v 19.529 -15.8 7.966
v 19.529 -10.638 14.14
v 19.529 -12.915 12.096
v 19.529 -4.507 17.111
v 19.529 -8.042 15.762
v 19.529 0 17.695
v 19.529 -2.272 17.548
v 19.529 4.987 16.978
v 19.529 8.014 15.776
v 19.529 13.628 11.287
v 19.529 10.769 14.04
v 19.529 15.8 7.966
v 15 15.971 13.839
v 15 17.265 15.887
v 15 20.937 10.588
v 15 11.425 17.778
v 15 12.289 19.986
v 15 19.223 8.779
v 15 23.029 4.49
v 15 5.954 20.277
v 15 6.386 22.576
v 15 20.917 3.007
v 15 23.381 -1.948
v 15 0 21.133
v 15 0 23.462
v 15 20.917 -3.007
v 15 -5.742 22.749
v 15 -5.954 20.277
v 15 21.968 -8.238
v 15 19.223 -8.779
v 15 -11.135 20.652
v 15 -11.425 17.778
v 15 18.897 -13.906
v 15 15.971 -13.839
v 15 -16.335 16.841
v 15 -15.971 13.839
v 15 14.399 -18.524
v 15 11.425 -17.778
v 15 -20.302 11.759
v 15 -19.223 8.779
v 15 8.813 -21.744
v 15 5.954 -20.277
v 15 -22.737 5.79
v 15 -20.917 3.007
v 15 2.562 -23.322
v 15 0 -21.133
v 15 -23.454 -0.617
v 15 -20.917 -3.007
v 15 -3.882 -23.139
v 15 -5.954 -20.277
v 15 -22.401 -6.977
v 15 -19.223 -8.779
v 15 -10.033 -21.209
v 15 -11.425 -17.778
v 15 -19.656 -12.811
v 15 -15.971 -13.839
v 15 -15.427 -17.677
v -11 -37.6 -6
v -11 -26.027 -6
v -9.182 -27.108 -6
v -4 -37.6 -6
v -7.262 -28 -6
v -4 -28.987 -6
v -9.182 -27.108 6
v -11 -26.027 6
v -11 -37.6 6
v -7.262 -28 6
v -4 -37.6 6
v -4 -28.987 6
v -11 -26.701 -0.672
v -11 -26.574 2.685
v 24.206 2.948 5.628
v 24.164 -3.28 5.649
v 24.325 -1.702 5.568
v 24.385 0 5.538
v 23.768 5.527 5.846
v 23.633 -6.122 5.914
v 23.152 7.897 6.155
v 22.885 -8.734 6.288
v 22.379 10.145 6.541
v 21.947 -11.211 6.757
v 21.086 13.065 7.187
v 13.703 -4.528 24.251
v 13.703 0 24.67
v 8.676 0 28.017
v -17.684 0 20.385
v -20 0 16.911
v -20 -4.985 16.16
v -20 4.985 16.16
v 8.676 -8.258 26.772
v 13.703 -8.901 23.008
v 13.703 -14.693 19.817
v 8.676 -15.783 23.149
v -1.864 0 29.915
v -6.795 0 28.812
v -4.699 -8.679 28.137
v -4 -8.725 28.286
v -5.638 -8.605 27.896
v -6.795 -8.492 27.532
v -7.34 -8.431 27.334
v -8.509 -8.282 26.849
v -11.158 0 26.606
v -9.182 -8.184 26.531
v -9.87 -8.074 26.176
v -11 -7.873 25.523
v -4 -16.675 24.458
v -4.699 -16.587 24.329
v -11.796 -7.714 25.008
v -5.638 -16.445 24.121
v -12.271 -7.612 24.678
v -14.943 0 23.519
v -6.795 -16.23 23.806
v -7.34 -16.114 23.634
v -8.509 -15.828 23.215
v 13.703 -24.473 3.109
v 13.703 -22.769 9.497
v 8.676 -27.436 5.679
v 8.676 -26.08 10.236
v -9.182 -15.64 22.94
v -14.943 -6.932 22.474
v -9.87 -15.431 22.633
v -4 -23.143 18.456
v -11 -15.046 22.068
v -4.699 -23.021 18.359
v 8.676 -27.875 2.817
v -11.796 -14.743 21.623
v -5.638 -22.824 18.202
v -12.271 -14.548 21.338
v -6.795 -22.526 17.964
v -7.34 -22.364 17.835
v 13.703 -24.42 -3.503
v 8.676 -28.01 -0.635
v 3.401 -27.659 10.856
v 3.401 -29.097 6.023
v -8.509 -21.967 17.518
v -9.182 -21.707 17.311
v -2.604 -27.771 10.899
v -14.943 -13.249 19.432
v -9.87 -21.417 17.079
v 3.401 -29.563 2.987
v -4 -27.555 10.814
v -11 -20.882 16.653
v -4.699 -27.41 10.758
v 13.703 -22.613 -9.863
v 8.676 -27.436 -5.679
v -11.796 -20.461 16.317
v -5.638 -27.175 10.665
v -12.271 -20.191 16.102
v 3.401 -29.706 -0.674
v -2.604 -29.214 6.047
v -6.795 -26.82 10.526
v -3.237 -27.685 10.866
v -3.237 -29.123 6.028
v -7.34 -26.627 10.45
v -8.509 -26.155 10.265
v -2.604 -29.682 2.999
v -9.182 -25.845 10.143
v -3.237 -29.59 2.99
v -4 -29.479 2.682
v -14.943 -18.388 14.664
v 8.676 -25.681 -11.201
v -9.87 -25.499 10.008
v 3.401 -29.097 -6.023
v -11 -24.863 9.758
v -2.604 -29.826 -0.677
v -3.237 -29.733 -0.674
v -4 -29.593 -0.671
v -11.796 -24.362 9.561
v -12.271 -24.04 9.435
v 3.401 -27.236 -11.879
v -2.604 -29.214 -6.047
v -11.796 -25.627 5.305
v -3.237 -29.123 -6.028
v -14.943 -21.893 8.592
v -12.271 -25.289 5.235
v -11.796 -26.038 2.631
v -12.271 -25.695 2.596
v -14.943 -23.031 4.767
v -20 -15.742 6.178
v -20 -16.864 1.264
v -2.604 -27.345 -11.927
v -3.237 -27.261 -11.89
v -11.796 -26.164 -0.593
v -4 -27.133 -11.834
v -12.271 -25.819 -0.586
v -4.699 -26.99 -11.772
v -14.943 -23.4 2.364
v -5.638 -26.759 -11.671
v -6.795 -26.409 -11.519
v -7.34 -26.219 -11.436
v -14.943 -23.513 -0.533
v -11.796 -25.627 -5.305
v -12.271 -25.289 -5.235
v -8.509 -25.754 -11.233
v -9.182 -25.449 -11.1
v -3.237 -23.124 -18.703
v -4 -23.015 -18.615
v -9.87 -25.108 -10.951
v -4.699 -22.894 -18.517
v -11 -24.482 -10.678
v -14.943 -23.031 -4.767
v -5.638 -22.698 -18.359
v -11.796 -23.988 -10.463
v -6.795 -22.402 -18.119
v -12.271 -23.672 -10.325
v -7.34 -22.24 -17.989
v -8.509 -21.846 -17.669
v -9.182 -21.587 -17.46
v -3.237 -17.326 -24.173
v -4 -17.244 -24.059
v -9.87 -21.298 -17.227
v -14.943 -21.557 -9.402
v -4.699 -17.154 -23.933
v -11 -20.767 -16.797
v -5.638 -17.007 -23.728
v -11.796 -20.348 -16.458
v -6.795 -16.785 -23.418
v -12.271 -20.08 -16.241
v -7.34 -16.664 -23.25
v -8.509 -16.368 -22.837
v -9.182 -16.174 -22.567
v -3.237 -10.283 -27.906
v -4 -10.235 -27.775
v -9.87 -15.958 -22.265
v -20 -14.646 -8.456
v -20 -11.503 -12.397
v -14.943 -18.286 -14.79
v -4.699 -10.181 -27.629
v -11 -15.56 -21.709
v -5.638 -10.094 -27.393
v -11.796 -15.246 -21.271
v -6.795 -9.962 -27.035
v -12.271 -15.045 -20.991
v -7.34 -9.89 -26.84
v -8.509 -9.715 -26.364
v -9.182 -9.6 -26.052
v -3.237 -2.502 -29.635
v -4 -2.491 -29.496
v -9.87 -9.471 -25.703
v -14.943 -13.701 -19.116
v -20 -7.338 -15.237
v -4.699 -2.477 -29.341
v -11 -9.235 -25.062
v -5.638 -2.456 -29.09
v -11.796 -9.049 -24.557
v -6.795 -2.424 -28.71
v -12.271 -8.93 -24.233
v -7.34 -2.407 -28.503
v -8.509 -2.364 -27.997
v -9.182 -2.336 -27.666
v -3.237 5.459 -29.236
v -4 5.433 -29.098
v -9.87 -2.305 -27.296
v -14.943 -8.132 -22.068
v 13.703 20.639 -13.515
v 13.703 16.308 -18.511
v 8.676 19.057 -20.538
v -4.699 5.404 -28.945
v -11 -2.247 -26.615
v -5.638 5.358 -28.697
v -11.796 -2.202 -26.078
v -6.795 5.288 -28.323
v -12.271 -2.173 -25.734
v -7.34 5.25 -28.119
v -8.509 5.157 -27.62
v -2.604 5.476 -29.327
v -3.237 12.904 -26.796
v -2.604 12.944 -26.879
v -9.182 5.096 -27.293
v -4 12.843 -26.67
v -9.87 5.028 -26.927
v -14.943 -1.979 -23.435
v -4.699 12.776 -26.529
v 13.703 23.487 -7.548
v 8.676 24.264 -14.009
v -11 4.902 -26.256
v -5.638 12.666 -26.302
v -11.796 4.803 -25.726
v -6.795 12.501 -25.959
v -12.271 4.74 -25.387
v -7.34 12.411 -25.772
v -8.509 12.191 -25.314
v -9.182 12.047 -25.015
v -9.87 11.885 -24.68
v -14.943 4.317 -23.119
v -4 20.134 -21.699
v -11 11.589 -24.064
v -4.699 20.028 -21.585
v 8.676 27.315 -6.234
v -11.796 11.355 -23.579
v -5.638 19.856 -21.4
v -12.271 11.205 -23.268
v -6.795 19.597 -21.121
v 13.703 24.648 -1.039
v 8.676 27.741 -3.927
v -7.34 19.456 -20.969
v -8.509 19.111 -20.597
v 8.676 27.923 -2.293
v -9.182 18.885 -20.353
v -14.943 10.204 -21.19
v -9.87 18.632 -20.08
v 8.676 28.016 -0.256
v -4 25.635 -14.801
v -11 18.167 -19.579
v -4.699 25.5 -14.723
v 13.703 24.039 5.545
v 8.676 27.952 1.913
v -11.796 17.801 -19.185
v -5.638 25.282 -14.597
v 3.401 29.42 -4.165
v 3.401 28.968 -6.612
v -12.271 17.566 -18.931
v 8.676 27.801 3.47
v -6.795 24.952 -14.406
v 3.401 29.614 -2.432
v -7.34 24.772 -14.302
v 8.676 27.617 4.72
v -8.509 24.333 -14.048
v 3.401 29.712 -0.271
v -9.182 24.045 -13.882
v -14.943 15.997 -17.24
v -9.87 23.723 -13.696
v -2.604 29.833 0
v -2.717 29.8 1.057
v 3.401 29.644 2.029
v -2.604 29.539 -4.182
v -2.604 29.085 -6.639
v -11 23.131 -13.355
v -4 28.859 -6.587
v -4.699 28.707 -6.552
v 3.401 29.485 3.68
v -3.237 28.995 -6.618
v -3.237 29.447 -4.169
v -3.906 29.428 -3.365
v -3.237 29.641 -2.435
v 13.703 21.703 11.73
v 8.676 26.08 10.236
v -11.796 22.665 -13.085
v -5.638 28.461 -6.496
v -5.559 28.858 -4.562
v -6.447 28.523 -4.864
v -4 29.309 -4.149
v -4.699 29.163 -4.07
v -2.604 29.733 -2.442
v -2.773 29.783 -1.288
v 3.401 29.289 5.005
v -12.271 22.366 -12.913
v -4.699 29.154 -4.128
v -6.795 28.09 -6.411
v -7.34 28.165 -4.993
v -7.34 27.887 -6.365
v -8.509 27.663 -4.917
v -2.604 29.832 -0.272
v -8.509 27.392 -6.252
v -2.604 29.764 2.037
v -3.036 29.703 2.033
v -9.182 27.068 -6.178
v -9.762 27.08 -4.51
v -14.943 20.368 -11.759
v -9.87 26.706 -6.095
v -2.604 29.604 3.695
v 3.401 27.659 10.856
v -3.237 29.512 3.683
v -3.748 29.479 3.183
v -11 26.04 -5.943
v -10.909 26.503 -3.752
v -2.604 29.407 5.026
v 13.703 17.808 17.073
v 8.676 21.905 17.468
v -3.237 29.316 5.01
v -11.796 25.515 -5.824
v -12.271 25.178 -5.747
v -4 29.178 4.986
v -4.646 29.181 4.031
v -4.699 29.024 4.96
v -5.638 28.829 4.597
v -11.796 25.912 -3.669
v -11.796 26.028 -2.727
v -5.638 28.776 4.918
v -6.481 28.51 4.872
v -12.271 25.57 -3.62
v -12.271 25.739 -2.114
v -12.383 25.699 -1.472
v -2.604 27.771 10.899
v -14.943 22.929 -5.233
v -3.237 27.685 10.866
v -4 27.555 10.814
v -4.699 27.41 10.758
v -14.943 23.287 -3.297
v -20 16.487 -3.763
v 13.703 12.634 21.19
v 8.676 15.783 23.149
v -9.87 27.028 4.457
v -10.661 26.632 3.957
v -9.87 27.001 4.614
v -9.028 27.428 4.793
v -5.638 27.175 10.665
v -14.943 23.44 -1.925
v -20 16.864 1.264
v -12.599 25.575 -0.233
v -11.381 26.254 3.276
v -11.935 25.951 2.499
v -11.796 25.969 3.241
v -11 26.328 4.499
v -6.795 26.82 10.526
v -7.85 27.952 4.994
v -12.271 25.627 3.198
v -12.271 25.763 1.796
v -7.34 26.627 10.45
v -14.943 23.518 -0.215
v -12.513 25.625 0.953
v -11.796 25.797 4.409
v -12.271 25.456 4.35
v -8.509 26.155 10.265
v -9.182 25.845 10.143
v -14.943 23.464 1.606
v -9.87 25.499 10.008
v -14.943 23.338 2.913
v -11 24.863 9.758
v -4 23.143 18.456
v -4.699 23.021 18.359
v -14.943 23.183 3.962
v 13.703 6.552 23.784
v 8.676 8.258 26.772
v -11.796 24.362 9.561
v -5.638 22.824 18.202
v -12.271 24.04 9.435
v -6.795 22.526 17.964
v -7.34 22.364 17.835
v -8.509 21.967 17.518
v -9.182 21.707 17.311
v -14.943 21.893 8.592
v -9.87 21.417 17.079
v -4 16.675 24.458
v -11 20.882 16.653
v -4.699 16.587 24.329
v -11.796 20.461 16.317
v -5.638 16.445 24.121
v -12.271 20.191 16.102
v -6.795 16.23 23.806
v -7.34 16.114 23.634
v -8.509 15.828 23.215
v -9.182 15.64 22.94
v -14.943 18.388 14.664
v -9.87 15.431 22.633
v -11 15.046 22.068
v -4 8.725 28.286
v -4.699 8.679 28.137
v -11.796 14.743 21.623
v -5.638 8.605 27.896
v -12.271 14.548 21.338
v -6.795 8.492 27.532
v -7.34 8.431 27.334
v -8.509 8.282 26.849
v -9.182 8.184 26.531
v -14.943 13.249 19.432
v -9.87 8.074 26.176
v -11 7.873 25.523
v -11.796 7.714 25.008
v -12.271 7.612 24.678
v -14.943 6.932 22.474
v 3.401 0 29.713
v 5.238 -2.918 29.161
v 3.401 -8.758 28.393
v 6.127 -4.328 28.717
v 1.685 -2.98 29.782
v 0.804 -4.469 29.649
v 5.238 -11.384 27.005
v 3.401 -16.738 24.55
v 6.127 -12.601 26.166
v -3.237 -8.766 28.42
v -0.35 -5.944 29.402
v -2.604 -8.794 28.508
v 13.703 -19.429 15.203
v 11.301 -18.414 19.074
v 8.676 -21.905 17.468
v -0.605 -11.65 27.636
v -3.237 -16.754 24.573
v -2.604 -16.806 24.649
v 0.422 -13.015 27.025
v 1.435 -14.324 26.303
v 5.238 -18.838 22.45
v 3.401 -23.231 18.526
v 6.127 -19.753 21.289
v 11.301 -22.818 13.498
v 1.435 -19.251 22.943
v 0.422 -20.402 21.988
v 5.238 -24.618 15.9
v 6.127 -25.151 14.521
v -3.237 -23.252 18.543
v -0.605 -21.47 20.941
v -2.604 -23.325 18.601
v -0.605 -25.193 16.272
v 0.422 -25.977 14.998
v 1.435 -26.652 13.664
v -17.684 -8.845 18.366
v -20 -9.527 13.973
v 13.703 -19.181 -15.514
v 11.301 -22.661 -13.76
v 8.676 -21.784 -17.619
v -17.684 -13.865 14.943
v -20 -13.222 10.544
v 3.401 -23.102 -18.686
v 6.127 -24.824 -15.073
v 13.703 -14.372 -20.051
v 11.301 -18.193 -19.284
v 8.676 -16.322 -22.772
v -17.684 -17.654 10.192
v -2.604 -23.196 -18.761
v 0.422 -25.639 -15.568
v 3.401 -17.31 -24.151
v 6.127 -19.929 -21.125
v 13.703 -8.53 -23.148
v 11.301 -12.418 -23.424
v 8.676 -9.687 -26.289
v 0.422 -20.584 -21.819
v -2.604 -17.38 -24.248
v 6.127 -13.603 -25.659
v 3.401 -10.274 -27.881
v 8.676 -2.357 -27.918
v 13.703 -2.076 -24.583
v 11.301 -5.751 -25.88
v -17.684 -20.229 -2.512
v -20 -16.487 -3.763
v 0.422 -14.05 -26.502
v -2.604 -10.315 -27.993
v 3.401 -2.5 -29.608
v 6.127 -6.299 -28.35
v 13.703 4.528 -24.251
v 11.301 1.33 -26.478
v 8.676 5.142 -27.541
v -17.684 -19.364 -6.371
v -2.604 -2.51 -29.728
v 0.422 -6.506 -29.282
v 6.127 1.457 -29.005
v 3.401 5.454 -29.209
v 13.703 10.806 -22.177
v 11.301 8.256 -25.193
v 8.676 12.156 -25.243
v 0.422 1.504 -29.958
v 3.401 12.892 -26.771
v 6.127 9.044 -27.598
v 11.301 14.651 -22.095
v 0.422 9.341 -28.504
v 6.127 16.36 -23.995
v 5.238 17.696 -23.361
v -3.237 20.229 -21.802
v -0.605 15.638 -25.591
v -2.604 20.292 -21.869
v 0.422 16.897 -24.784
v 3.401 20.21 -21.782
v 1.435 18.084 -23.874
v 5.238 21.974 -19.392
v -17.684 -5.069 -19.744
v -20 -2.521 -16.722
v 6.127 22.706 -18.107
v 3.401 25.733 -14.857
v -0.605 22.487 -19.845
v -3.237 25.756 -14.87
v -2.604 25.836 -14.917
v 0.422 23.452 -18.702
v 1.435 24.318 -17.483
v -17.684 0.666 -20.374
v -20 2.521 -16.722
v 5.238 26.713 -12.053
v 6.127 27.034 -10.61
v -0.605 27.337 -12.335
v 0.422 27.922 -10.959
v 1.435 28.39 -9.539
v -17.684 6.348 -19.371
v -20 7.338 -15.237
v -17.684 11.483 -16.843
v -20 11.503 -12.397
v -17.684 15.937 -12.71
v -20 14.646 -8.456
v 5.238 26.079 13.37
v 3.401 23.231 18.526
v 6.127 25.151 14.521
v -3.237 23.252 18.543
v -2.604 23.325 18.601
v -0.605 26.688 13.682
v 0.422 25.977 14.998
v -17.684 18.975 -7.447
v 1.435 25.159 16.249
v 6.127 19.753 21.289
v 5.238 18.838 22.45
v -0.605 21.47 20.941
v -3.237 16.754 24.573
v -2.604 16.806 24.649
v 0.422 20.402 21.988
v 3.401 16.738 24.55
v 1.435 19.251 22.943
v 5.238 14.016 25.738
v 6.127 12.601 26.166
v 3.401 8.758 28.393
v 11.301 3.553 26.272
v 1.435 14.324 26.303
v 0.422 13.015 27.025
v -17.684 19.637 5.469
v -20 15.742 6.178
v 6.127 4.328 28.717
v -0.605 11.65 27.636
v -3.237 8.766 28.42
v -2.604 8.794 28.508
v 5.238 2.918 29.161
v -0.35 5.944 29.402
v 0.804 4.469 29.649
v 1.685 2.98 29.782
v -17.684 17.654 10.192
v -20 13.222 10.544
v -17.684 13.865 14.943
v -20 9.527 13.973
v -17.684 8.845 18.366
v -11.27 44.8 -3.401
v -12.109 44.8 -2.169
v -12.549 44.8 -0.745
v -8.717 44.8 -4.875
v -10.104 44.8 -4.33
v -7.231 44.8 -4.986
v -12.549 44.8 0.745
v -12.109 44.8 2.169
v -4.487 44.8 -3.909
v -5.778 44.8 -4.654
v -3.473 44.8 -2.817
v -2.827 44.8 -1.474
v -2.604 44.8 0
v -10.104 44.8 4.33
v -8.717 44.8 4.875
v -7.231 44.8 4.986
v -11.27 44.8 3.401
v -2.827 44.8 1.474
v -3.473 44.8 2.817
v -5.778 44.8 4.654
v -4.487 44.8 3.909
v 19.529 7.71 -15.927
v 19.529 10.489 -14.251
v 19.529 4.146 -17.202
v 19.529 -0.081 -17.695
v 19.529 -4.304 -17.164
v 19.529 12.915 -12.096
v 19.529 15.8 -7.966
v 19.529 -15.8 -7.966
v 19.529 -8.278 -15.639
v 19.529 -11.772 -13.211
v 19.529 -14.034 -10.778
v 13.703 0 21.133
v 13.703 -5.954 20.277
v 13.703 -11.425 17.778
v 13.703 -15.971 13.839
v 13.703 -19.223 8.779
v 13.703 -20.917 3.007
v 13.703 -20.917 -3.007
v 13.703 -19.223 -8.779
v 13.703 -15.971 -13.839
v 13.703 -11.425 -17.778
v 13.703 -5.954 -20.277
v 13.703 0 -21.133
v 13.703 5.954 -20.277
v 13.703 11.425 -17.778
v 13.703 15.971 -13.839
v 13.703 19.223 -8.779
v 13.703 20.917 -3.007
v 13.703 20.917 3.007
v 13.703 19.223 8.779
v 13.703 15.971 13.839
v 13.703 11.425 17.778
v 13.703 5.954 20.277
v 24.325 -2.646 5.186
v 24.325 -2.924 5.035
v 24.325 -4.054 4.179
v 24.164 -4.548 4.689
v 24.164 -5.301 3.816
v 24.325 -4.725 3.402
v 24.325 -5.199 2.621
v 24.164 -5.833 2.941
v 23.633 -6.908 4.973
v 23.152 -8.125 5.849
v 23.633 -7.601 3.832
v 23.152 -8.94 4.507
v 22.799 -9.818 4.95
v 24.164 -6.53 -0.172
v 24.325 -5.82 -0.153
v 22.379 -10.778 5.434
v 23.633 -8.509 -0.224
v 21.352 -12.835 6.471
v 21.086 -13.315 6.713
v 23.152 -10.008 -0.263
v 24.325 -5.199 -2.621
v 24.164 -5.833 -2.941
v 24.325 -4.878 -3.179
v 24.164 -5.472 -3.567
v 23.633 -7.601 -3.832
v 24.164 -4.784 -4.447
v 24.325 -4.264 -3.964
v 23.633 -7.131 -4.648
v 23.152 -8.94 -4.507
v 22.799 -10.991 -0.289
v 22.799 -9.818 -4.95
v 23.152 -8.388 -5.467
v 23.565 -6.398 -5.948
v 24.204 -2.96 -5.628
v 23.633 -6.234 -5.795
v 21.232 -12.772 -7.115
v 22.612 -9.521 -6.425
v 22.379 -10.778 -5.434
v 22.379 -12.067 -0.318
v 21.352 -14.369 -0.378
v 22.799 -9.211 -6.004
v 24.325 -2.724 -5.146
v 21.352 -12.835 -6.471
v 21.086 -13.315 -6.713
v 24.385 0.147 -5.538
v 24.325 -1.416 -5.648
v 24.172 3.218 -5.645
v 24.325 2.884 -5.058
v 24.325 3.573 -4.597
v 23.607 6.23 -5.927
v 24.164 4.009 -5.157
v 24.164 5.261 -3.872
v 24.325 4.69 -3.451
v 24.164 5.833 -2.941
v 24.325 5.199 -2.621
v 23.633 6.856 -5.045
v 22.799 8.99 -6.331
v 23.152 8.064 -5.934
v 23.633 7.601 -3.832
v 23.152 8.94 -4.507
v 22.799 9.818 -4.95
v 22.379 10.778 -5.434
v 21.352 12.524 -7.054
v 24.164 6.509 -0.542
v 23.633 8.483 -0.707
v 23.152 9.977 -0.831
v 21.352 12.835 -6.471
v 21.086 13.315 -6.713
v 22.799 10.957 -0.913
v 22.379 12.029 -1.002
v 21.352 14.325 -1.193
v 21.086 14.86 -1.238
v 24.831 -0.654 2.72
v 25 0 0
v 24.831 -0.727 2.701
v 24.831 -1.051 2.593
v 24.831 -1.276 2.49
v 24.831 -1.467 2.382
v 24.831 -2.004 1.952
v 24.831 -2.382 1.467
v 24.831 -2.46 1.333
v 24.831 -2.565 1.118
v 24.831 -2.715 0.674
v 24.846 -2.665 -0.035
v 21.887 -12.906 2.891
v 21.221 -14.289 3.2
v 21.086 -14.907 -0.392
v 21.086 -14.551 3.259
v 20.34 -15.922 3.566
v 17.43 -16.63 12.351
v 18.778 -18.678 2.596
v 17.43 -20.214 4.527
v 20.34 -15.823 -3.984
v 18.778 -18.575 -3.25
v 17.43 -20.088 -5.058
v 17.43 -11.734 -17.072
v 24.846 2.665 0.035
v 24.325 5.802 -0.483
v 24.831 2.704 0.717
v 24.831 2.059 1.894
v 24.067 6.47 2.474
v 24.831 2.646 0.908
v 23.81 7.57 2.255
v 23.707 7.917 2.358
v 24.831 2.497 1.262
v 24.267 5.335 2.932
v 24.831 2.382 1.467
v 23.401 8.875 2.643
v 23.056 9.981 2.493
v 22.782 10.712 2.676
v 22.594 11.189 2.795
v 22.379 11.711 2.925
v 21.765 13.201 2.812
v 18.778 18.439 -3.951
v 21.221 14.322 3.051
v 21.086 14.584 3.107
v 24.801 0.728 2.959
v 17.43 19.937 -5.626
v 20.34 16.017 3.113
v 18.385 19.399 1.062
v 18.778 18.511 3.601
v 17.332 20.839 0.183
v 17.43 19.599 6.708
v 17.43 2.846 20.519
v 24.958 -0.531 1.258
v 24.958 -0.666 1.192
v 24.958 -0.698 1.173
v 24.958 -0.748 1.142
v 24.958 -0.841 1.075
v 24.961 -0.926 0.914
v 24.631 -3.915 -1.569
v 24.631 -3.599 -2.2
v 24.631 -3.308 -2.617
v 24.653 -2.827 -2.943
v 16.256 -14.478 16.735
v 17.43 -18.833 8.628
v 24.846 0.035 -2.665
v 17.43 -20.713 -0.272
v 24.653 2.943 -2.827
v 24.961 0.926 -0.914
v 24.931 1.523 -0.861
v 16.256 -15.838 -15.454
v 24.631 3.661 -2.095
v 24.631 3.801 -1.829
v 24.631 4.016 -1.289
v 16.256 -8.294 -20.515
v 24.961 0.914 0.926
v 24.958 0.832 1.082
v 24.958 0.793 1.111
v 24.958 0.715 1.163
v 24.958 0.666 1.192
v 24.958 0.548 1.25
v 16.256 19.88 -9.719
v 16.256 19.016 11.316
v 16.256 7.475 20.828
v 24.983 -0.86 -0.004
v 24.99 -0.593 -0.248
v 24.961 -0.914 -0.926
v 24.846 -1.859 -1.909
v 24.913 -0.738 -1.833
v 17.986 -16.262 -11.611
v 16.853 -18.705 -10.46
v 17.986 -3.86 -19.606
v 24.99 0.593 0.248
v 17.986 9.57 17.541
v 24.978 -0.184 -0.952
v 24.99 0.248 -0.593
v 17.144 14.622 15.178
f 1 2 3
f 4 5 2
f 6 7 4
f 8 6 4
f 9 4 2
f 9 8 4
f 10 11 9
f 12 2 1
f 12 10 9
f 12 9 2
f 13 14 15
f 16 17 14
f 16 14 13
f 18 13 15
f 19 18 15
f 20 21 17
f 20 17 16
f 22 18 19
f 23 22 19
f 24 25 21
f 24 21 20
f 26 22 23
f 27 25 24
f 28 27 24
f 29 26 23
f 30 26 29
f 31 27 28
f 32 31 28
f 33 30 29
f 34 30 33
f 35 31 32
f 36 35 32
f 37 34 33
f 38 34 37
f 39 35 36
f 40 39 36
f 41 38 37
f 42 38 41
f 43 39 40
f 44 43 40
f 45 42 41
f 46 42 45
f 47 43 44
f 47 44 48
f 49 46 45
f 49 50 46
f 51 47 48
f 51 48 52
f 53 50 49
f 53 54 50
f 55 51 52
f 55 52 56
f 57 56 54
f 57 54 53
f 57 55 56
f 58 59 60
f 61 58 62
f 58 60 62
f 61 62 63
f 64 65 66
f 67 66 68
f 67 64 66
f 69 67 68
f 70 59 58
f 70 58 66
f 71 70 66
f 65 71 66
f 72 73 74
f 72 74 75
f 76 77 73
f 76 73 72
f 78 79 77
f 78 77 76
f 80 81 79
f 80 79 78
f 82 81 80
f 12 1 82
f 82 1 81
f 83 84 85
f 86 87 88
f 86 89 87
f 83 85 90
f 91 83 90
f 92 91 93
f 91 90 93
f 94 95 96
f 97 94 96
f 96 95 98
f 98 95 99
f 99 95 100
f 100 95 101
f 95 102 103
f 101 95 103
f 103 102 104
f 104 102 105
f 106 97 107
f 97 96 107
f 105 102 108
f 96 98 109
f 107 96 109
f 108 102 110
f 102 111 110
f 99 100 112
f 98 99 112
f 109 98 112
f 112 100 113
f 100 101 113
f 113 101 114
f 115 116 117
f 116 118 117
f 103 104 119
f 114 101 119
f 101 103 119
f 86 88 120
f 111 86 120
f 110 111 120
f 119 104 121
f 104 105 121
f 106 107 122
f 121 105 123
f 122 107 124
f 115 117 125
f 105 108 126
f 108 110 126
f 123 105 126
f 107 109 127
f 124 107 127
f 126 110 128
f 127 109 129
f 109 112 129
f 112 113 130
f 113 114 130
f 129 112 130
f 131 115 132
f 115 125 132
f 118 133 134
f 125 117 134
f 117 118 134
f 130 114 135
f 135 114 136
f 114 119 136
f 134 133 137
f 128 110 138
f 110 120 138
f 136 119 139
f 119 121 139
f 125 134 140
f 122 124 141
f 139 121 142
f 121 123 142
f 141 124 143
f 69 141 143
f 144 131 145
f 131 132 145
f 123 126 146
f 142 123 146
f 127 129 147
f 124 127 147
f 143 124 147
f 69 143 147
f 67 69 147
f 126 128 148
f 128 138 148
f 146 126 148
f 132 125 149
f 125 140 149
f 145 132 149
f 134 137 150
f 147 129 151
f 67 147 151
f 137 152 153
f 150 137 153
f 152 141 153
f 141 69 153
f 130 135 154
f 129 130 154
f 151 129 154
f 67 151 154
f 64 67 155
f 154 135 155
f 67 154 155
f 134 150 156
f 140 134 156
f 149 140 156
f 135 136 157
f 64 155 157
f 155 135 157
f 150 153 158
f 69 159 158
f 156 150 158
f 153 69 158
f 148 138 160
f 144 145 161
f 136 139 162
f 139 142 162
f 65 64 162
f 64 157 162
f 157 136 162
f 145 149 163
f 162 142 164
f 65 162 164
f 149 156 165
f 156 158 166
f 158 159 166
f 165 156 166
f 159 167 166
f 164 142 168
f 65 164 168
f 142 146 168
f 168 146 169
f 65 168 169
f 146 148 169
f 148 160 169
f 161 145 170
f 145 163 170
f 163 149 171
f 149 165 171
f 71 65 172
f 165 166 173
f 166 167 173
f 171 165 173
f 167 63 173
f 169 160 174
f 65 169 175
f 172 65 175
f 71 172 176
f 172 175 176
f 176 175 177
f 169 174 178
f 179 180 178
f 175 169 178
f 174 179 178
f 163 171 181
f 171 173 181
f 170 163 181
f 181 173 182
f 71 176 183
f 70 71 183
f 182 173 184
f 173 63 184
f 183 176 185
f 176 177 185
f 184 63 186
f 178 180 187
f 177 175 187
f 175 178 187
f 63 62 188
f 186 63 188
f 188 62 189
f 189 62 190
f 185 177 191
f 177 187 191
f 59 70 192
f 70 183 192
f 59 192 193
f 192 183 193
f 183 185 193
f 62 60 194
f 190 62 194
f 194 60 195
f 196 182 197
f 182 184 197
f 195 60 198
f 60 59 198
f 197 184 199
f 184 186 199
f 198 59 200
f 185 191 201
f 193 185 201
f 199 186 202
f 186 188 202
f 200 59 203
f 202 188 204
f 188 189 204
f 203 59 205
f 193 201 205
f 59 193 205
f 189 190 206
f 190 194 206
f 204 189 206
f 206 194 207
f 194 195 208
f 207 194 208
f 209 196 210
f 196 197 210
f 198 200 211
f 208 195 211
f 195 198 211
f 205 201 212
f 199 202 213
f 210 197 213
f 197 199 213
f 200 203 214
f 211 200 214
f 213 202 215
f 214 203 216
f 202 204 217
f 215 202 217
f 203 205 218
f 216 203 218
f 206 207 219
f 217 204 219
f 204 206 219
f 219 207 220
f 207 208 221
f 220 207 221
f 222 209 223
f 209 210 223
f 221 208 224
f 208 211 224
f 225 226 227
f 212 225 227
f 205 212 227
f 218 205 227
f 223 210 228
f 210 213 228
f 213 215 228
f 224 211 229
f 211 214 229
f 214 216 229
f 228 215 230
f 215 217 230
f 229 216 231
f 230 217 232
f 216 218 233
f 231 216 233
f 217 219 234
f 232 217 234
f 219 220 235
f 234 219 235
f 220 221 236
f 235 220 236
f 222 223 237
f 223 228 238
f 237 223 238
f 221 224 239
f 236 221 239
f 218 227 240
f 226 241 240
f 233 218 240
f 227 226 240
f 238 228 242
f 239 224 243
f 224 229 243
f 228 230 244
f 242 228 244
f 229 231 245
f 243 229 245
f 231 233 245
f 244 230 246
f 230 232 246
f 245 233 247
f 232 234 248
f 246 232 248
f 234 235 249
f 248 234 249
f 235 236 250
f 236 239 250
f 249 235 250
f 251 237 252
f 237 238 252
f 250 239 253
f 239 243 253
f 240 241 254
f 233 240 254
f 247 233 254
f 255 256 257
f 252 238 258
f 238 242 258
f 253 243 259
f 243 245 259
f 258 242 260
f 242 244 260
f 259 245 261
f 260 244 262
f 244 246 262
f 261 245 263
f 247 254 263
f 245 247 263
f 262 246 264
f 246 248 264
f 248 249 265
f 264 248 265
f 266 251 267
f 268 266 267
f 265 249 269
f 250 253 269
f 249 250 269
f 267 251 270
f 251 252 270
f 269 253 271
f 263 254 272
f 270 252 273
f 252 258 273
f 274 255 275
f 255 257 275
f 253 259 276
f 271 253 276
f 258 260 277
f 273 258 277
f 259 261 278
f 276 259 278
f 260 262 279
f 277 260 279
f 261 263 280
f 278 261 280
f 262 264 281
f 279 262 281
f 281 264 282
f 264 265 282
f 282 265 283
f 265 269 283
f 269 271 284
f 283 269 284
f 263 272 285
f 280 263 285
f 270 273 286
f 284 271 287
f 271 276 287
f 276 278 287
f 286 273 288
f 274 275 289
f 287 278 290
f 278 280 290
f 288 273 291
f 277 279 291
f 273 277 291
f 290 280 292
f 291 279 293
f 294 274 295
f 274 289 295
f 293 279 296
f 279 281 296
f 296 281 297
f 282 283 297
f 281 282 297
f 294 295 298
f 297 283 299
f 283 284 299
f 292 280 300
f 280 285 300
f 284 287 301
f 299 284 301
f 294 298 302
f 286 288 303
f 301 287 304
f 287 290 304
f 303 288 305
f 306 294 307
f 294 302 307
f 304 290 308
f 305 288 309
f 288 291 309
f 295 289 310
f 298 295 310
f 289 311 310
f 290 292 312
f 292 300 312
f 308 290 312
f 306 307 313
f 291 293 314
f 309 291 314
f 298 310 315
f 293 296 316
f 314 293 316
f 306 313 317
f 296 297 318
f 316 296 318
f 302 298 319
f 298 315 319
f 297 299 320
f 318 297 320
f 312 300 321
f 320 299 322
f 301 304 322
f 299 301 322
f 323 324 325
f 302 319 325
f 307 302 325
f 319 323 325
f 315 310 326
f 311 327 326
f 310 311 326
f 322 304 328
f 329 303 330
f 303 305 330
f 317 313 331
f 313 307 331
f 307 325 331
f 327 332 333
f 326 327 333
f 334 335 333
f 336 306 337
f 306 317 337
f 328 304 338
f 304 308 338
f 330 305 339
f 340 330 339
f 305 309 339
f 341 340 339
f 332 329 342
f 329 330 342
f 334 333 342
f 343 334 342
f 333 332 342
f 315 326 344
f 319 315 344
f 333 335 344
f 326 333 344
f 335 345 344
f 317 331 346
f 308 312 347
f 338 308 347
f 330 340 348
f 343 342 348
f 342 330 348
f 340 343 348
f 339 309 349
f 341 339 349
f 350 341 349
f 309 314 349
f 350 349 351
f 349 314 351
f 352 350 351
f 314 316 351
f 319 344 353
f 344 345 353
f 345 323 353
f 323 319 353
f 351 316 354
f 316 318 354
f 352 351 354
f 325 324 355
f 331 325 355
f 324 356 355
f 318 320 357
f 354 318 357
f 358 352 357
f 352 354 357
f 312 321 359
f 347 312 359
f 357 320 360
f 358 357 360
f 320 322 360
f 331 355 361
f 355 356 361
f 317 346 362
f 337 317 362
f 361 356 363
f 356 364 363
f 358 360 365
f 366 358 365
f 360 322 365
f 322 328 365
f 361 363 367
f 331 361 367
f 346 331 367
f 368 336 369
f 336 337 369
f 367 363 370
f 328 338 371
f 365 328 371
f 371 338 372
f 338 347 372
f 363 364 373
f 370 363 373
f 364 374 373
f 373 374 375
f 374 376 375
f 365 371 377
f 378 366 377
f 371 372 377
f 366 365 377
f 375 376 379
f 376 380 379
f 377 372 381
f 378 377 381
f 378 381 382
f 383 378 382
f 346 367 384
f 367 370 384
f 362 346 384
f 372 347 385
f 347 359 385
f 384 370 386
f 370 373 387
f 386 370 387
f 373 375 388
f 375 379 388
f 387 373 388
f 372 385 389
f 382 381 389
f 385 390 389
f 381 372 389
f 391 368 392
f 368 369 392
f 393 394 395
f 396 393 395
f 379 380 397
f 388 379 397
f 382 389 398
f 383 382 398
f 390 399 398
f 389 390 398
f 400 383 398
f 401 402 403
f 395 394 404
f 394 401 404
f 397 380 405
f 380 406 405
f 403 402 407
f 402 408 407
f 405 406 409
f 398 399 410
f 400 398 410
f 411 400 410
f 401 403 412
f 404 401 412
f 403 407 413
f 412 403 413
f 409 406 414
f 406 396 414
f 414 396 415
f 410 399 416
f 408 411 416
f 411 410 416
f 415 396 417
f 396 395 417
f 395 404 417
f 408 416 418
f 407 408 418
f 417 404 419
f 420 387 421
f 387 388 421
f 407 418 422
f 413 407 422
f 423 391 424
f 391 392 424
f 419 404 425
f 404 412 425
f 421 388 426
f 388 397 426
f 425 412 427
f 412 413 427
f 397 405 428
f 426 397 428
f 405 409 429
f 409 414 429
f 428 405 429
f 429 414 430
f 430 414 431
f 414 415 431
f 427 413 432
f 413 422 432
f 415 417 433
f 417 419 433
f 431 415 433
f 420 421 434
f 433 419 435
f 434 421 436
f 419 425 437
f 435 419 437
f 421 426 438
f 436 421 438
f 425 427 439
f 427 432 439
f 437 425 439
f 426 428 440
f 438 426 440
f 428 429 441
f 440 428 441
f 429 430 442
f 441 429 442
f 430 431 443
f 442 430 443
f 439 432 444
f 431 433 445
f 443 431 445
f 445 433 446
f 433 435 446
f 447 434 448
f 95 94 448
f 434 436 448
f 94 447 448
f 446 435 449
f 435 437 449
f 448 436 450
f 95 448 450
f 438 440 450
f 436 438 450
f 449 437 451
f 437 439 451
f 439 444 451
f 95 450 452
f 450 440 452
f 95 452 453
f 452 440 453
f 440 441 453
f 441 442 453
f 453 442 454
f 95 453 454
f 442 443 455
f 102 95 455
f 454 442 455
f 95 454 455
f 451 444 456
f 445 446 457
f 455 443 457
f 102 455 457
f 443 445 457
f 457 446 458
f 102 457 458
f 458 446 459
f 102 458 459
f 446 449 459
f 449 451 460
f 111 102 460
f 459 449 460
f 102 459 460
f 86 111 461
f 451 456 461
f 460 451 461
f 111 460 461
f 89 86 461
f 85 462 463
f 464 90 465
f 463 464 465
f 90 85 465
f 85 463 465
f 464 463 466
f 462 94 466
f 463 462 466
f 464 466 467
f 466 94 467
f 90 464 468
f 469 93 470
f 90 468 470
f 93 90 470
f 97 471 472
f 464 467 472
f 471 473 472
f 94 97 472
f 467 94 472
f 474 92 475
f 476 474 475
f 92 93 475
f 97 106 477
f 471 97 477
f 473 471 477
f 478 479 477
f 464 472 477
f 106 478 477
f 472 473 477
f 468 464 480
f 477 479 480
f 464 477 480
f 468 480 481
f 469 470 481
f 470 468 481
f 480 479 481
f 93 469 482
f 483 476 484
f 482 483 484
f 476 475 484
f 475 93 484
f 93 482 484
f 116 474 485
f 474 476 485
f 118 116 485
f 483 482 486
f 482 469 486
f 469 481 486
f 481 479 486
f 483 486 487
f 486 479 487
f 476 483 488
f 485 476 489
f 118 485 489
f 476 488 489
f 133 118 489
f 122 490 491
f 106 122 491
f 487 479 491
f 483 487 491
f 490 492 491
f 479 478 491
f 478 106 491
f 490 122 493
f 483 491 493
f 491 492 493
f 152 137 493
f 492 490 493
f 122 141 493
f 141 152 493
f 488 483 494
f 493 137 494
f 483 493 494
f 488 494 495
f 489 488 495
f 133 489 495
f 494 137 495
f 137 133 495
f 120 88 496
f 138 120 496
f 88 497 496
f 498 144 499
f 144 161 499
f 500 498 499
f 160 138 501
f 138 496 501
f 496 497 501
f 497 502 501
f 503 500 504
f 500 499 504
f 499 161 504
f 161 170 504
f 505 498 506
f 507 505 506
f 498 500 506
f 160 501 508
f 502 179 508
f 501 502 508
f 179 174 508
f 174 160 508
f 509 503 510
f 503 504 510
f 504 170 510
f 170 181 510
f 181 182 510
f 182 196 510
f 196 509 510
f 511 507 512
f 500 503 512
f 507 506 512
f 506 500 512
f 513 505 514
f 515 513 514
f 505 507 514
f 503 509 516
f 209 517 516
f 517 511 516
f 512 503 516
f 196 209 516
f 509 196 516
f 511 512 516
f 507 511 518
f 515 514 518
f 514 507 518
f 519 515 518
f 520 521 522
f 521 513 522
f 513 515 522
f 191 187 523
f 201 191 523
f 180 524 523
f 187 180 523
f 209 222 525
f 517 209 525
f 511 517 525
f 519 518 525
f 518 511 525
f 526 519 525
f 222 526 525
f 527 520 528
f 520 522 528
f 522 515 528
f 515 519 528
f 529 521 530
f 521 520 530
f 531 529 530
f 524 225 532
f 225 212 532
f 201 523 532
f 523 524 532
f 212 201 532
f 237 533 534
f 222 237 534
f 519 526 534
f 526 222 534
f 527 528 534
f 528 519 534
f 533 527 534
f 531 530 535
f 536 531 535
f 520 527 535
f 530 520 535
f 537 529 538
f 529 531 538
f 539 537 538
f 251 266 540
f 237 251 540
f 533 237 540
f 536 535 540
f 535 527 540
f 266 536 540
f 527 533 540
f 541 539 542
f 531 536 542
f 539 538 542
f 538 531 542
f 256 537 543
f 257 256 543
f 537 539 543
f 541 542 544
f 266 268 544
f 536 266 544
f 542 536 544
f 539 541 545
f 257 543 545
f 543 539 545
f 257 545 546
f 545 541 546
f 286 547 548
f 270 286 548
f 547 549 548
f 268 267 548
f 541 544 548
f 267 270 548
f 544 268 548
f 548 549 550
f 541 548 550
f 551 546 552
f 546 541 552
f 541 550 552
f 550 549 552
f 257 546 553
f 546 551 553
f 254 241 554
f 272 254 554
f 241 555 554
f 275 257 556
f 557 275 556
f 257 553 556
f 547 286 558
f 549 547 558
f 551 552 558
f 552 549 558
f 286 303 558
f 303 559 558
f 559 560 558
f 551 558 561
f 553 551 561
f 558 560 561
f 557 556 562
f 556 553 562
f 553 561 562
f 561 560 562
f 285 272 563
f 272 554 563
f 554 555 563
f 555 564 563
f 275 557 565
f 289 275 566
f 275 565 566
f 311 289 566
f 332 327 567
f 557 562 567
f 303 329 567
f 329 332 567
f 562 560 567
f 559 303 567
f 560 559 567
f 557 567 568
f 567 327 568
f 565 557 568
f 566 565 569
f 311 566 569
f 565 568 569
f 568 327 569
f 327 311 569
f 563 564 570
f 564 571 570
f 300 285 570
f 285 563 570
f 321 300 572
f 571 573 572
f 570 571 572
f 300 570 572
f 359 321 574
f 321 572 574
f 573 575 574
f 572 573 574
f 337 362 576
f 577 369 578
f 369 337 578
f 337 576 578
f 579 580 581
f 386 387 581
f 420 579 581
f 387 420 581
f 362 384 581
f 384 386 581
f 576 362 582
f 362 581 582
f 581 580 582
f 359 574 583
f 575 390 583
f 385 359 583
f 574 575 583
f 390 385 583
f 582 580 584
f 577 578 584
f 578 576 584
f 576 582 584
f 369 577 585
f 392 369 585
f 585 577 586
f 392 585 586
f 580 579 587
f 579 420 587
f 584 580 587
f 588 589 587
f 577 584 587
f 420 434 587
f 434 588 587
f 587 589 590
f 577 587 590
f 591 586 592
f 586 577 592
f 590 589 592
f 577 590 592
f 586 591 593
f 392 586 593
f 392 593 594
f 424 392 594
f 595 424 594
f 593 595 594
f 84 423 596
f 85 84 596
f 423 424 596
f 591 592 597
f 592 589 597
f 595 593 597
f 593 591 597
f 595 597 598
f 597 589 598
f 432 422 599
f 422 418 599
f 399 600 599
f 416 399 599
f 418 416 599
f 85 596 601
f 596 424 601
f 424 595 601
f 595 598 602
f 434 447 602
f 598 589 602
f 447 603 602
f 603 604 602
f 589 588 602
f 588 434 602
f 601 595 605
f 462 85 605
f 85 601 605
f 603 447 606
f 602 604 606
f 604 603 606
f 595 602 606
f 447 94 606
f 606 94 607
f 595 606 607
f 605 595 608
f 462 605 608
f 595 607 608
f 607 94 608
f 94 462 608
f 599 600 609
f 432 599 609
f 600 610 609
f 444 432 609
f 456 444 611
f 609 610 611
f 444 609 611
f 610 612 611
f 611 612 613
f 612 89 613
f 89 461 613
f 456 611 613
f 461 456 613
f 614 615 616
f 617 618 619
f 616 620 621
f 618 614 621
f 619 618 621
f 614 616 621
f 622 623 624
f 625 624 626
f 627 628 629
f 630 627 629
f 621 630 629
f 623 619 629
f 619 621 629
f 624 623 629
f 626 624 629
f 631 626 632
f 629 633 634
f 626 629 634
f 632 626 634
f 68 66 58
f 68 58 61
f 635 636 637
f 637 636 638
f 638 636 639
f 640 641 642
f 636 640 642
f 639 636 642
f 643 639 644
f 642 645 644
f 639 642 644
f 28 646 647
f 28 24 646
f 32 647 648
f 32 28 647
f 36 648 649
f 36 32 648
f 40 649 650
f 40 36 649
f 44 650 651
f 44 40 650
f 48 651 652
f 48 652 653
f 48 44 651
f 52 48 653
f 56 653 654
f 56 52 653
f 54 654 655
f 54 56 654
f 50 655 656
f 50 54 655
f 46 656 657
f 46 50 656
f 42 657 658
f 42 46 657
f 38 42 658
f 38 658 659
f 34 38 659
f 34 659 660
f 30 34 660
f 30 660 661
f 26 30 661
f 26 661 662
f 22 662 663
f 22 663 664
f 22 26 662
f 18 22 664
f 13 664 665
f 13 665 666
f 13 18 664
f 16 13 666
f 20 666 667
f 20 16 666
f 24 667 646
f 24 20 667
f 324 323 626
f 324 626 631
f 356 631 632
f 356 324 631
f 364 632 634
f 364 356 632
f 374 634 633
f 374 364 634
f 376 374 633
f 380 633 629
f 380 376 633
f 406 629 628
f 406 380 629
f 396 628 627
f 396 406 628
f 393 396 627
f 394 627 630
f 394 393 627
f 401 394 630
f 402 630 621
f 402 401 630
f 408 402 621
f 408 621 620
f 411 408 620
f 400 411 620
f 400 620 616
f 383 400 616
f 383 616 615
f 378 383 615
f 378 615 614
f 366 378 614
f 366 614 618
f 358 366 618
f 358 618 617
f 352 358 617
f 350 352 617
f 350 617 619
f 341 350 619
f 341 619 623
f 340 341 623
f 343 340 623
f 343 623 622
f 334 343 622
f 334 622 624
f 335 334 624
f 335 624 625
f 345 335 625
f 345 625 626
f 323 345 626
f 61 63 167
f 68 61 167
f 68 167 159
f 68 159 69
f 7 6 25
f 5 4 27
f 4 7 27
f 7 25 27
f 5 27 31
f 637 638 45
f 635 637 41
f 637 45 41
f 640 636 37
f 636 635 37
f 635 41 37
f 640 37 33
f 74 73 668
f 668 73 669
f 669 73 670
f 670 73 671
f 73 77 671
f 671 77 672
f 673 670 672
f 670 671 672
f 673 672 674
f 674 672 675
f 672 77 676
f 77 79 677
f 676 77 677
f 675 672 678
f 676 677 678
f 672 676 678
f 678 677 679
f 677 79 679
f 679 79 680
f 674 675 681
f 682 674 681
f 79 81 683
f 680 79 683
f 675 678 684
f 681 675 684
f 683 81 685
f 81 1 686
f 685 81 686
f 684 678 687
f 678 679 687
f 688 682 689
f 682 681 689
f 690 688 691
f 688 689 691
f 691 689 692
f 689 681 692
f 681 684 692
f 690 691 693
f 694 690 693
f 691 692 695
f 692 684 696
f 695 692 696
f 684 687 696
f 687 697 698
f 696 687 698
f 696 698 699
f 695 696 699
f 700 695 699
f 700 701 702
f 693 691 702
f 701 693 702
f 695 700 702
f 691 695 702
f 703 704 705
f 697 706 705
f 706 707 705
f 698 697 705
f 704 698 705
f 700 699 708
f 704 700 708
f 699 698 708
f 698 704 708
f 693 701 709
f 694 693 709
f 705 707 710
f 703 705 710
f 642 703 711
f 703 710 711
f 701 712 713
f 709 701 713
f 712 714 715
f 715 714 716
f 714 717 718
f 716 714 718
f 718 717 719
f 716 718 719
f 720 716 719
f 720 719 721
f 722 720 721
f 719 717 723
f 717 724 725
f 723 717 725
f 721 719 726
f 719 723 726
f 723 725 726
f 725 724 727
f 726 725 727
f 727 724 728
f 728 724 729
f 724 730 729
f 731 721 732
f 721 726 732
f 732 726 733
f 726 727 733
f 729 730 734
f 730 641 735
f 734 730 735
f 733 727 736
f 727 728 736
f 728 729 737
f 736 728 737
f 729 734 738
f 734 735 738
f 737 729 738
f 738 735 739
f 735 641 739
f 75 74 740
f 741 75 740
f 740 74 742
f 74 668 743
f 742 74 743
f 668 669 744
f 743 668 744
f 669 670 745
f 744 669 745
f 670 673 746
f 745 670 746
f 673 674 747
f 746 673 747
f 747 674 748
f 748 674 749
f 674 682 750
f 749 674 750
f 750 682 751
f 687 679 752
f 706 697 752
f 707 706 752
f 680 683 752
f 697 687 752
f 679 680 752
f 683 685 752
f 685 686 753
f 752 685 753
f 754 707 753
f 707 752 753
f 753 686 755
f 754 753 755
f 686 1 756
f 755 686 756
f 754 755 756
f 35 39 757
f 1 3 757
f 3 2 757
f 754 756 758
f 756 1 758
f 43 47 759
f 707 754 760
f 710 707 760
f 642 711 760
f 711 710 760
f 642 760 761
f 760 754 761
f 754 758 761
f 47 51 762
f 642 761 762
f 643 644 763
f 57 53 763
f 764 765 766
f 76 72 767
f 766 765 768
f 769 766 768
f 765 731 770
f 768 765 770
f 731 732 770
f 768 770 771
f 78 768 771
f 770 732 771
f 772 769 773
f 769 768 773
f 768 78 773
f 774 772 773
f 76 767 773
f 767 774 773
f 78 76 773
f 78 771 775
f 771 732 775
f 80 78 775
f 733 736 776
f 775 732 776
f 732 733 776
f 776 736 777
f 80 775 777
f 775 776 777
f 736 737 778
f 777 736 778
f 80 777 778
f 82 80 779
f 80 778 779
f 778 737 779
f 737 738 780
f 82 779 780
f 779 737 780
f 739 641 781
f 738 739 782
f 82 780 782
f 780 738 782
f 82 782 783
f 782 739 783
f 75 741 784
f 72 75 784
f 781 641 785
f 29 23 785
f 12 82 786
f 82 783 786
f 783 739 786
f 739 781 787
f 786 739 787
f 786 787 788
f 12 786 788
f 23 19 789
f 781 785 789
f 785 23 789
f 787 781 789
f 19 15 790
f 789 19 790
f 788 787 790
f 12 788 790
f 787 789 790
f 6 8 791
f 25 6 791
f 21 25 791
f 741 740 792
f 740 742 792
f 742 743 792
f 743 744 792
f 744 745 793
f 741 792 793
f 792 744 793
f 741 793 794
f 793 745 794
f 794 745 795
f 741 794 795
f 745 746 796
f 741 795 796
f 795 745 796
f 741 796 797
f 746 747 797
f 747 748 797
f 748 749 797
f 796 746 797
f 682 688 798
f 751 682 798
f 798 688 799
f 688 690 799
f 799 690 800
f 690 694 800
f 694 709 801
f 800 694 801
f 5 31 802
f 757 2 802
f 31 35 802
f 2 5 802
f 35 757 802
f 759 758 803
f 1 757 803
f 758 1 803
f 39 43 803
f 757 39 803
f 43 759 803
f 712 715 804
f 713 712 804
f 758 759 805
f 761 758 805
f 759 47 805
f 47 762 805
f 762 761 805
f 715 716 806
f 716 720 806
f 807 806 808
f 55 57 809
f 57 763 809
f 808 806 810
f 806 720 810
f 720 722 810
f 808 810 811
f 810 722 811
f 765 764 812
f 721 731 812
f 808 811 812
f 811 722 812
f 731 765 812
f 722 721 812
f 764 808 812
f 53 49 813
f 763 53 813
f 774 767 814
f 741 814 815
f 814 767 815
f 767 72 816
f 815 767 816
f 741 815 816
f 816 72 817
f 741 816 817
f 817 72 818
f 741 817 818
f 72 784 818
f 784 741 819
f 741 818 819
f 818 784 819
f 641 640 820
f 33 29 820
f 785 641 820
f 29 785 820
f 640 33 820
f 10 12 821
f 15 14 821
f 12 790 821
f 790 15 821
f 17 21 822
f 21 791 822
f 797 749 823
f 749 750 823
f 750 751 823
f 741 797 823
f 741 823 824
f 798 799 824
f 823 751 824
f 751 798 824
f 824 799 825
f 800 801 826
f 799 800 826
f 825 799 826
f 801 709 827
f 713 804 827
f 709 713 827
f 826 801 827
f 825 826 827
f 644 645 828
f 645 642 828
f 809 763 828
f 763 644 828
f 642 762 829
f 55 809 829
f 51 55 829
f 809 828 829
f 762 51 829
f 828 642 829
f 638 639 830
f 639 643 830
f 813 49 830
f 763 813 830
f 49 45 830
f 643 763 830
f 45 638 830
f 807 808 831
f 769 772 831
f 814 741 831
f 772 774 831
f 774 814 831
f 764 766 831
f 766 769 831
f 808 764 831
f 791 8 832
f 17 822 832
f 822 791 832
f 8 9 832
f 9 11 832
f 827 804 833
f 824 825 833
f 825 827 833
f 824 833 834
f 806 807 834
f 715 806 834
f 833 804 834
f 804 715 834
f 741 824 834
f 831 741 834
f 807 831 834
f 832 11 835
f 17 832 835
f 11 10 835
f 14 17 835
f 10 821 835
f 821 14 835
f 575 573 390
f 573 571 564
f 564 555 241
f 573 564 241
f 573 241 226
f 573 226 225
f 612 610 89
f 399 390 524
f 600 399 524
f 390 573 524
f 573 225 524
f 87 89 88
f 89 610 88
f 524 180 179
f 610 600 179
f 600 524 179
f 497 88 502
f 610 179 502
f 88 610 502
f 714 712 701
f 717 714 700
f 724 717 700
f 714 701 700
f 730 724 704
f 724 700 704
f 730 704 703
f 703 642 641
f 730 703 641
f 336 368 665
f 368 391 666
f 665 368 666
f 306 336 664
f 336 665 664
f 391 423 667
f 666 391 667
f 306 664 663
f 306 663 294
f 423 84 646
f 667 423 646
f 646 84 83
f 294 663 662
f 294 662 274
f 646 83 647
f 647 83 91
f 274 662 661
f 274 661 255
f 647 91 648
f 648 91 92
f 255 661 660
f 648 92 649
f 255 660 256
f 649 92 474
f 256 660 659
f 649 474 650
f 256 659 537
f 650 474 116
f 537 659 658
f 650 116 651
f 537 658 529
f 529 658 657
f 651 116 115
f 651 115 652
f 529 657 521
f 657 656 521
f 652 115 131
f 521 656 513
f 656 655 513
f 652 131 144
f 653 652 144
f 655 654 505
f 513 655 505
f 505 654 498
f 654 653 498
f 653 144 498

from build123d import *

# Parameters (mm, degrees)
F3_DEPTH = 20
F4_W     = 1.2972189062
F4_H     = 10.2779610492
F6_W     = 7
F6_H     = 12
F7_DEPTH = 37.6
F8_R     = 5
F9_DEPTH = 44.8


with BuildPart() as f1:
    # F0 (on Front) → F1 (revolve)
    with BuildSketch(Plane.XZ):
        with BuildLine():
            add(Edge.make_bspline(
                [(0, 30), (16.2610174256, 30), (25, 10.9921857571), (25, 0)],
                knots=[0, 0, 0, 0, 39.0512483795, 39.0512483795, 39.0512483795, 39.0512483795], degree=3))
            add(Edge.make_bspline(
                [(0, 30), (-9.0857928701, 30), (-15.8232208718, 24.065796812), (-20, 16.9113518854)],
                knots=[0, 0, 0, 0, 21.8197634754, 21.8197634754, 21.8197634754, 21.8197634754], degree=3))
            Line((-20, 16.9113518854), (-20, 0))
            Line((-20, 0), (25, 0))
        make_face()
    revolve(axis=Axis((12.5, 0, 0), (1, 0, 0)))

    # F2 (on Front) → F3 (cut, symmetric)
    with BuildSketch(Plane.XZ):
        Polygon((26.4112874866, 18.832474947), (19.5291824639, 19.1946905106), (19.5291824639, 7.9659949988), (26.4112874866, 4.5249424875), align=None)
        Polygon((19.5291824639, -7.9659949988), (19.5291824639, -19.1946905106), (26.4112874866, -18.832474947), (26.4112874866, -4.5249424875), align=None)
    extrude(amount=F3_DEPTH, both=True, mode=Mode.SUBTRACT)

    # F4 (on Front) → F5 (revolve, cut)
    with BuildSketch(Plane.XZ):
        with Locations((14.3513905469, 26.2715257704)):
            Rectangle(F4_W, F4_H)
    revolve(axis=Axis((7.8121407423, 0, 0), (1, 0, 0)), mode=Mode.SUBTRACT)

    # F6 (on Front) → F7 (join)
    with BuildSketch(Plane.XZ):
        with Locations((-7.5, 0)):
            Rectangle(F6_W, F6_H)
    extrude(amount=F7_DEPTH)

    # F8 (on Front) → F9 (join)
    with BuildSketch(Plane.XZ):
        with Locations((-7.6043987647, 0)):
            Circle(F8_R)
    extrude(amount=-F9_DEPTH)


solid = f1.part
